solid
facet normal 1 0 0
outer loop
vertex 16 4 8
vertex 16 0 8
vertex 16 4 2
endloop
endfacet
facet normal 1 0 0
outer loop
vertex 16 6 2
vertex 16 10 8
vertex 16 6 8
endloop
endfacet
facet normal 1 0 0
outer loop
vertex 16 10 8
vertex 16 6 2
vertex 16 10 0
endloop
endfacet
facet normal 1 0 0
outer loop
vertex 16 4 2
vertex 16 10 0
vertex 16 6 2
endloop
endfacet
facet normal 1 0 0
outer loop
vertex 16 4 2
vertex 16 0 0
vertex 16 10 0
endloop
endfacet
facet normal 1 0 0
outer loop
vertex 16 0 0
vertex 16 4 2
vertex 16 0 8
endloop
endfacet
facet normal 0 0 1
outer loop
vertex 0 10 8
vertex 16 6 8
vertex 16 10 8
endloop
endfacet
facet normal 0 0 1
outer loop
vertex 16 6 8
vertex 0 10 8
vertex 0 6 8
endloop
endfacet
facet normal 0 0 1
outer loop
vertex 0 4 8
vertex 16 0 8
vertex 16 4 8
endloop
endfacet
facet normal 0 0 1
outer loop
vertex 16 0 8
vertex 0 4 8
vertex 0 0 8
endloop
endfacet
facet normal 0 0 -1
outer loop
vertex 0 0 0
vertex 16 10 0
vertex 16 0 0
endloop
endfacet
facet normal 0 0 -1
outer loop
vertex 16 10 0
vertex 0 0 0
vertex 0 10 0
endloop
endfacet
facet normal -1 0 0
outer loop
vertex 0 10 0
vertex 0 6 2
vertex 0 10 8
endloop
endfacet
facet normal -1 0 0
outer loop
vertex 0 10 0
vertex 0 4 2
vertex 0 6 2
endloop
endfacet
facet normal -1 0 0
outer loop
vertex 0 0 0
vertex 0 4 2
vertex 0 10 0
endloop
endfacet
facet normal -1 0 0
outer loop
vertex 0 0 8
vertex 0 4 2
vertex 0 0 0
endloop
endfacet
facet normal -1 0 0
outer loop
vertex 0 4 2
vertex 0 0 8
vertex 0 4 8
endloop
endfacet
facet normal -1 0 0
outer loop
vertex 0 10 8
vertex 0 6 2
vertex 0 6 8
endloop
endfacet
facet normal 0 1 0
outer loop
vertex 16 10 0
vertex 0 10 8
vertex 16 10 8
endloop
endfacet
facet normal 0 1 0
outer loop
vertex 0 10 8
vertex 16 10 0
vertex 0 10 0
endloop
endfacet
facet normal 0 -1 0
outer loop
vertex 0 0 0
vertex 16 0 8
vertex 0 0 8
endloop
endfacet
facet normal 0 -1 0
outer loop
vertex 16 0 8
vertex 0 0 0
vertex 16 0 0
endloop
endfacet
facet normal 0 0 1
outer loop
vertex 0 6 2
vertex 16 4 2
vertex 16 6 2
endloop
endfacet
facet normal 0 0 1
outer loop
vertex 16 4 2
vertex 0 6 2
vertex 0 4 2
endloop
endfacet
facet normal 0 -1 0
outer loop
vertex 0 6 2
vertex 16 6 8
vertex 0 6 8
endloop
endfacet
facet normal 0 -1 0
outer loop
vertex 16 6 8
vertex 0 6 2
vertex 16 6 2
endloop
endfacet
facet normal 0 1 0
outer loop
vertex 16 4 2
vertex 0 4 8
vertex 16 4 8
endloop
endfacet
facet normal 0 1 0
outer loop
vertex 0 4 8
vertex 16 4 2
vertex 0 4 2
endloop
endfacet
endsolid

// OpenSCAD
$fn = 32;

// ----------------------------------------------------------------------
// Micro clip: slotted block, 5-20 mm class
// ----------------------------------------------------------------------

// --- parameters (mm) ---
block_l = 16;             // block length, X
block_w = 10;             // block width, Y
block_h = 8;              // block height, Z
slot_w = 2;               // slot width
slot_d = 6;               // slot depth from the top

difference() {
  cube([block_l, block_w, block_h]);
  translate([-1, block_w / 2 - slot_w / 2, block_h - slot_d])
    cube([block_l + 2, slot_w, slot_d + 1]);
}
